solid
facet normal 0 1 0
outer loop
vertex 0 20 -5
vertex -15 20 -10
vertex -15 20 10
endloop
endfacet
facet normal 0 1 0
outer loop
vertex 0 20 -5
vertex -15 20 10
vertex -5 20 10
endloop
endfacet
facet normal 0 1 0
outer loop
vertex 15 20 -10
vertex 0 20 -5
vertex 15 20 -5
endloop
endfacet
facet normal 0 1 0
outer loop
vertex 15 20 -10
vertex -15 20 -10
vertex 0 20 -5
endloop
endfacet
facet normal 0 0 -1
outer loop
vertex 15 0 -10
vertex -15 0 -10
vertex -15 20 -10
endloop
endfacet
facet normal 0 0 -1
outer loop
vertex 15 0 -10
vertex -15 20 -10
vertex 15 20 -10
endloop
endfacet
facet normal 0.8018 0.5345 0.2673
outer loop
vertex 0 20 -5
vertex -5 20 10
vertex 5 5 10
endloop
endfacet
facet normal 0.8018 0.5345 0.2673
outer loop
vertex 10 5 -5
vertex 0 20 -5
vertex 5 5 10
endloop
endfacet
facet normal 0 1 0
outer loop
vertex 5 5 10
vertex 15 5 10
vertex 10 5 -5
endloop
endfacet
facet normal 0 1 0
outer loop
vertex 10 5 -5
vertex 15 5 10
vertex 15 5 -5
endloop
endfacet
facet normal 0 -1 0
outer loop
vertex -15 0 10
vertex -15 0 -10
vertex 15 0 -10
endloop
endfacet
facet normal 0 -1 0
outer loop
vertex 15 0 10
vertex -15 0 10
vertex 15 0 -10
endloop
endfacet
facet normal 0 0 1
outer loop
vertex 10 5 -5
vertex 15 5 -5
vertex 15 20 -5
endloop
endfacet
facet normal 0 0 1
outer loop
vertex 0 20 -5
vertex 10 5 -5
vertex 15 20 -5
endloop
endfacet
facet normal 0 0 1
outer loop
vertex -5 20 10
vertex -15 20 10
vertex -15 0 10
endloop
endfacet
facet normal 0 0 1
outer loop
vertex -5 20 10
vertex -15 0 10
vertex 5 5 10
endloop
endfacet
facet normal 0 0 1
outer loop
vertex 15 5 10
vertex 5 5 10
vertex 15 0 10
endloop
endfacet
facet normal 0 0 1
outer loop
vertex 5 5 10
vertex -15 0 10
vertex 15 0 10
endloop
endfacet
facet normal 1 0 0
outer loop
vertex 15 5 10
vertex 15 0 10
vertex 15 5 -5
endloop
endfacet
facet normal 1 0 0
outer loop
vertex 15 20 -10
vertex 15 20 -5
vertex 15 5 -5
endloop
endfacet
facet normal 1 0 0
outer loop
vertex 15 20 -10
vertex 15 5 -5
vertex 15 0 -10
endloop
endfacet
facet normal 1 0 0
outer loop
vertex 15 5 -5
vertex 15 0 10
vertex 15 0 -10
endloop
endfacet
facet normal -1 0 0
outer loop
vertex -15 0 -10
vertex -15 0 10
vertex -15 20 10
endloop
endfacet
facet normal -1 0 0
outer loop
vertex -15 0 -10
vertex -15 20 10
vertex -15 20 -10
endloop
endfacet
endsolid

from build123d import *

# Parameters (mm, degrees)
SKETCH_1_W          = 30
SKETCH_1_H          = 20
EXTRUDE_1_DEPTH     = 20
CUT_EXTRUDE_3_REACH = 39.417
SKETCH_5_W          = 15
SKETCH_5_H          = 15


with BuildPart() as part:
    # 草圖1 → 填料-伸長1 (new body)
    with BuildSketch(Plane(origin=(0, 0, 0), x_dir=(1, 0, 0), z_dir=(0, 1, 0))):
        Rectangle(SKETCH_1_W, SKETCH_1_H)
    extrude(amount=EXTRUDE_1_DEPTH)

    # 除料-伸長3: up to this plane
    cut_extrude_3_end = Plane(origin=(7.5, 5, 2.5), z_dir=(-0.8017837257372732, -0.5345224838248487, -0.2672612419124243))
    # 草圖5 → 除料-伸長3 (cut, up to the surface)
    with BuildSketch(Plane(origin=(15, 0, 0), x_dir=(0, 0, -1), z_dir=(1, 0, 0)), mode=Mode.PRIVATE) as cut_extrude_3_sk1:
        with Locations((-2.5, 12.5)):
            Rectangle(SKETCH_5_W, SKETCH_5_H)
    cut_extrude_3_tool1 = split(extrude(cut_extrude_3_sk1.sketch, amount=-CUT_EXTRUDE_3_REACH, mode=Mode.PRIVATE), bisect_by=cut_extrude_3_end, keep=Keep.BOTH, mode=Mode.PRIVATE)
    add(cut_extrude_3_tool1.solids().sort_by_distance((15, 12.5, 2.5))[0], mode=Mode.SUBTRACT)


solid = part.part
